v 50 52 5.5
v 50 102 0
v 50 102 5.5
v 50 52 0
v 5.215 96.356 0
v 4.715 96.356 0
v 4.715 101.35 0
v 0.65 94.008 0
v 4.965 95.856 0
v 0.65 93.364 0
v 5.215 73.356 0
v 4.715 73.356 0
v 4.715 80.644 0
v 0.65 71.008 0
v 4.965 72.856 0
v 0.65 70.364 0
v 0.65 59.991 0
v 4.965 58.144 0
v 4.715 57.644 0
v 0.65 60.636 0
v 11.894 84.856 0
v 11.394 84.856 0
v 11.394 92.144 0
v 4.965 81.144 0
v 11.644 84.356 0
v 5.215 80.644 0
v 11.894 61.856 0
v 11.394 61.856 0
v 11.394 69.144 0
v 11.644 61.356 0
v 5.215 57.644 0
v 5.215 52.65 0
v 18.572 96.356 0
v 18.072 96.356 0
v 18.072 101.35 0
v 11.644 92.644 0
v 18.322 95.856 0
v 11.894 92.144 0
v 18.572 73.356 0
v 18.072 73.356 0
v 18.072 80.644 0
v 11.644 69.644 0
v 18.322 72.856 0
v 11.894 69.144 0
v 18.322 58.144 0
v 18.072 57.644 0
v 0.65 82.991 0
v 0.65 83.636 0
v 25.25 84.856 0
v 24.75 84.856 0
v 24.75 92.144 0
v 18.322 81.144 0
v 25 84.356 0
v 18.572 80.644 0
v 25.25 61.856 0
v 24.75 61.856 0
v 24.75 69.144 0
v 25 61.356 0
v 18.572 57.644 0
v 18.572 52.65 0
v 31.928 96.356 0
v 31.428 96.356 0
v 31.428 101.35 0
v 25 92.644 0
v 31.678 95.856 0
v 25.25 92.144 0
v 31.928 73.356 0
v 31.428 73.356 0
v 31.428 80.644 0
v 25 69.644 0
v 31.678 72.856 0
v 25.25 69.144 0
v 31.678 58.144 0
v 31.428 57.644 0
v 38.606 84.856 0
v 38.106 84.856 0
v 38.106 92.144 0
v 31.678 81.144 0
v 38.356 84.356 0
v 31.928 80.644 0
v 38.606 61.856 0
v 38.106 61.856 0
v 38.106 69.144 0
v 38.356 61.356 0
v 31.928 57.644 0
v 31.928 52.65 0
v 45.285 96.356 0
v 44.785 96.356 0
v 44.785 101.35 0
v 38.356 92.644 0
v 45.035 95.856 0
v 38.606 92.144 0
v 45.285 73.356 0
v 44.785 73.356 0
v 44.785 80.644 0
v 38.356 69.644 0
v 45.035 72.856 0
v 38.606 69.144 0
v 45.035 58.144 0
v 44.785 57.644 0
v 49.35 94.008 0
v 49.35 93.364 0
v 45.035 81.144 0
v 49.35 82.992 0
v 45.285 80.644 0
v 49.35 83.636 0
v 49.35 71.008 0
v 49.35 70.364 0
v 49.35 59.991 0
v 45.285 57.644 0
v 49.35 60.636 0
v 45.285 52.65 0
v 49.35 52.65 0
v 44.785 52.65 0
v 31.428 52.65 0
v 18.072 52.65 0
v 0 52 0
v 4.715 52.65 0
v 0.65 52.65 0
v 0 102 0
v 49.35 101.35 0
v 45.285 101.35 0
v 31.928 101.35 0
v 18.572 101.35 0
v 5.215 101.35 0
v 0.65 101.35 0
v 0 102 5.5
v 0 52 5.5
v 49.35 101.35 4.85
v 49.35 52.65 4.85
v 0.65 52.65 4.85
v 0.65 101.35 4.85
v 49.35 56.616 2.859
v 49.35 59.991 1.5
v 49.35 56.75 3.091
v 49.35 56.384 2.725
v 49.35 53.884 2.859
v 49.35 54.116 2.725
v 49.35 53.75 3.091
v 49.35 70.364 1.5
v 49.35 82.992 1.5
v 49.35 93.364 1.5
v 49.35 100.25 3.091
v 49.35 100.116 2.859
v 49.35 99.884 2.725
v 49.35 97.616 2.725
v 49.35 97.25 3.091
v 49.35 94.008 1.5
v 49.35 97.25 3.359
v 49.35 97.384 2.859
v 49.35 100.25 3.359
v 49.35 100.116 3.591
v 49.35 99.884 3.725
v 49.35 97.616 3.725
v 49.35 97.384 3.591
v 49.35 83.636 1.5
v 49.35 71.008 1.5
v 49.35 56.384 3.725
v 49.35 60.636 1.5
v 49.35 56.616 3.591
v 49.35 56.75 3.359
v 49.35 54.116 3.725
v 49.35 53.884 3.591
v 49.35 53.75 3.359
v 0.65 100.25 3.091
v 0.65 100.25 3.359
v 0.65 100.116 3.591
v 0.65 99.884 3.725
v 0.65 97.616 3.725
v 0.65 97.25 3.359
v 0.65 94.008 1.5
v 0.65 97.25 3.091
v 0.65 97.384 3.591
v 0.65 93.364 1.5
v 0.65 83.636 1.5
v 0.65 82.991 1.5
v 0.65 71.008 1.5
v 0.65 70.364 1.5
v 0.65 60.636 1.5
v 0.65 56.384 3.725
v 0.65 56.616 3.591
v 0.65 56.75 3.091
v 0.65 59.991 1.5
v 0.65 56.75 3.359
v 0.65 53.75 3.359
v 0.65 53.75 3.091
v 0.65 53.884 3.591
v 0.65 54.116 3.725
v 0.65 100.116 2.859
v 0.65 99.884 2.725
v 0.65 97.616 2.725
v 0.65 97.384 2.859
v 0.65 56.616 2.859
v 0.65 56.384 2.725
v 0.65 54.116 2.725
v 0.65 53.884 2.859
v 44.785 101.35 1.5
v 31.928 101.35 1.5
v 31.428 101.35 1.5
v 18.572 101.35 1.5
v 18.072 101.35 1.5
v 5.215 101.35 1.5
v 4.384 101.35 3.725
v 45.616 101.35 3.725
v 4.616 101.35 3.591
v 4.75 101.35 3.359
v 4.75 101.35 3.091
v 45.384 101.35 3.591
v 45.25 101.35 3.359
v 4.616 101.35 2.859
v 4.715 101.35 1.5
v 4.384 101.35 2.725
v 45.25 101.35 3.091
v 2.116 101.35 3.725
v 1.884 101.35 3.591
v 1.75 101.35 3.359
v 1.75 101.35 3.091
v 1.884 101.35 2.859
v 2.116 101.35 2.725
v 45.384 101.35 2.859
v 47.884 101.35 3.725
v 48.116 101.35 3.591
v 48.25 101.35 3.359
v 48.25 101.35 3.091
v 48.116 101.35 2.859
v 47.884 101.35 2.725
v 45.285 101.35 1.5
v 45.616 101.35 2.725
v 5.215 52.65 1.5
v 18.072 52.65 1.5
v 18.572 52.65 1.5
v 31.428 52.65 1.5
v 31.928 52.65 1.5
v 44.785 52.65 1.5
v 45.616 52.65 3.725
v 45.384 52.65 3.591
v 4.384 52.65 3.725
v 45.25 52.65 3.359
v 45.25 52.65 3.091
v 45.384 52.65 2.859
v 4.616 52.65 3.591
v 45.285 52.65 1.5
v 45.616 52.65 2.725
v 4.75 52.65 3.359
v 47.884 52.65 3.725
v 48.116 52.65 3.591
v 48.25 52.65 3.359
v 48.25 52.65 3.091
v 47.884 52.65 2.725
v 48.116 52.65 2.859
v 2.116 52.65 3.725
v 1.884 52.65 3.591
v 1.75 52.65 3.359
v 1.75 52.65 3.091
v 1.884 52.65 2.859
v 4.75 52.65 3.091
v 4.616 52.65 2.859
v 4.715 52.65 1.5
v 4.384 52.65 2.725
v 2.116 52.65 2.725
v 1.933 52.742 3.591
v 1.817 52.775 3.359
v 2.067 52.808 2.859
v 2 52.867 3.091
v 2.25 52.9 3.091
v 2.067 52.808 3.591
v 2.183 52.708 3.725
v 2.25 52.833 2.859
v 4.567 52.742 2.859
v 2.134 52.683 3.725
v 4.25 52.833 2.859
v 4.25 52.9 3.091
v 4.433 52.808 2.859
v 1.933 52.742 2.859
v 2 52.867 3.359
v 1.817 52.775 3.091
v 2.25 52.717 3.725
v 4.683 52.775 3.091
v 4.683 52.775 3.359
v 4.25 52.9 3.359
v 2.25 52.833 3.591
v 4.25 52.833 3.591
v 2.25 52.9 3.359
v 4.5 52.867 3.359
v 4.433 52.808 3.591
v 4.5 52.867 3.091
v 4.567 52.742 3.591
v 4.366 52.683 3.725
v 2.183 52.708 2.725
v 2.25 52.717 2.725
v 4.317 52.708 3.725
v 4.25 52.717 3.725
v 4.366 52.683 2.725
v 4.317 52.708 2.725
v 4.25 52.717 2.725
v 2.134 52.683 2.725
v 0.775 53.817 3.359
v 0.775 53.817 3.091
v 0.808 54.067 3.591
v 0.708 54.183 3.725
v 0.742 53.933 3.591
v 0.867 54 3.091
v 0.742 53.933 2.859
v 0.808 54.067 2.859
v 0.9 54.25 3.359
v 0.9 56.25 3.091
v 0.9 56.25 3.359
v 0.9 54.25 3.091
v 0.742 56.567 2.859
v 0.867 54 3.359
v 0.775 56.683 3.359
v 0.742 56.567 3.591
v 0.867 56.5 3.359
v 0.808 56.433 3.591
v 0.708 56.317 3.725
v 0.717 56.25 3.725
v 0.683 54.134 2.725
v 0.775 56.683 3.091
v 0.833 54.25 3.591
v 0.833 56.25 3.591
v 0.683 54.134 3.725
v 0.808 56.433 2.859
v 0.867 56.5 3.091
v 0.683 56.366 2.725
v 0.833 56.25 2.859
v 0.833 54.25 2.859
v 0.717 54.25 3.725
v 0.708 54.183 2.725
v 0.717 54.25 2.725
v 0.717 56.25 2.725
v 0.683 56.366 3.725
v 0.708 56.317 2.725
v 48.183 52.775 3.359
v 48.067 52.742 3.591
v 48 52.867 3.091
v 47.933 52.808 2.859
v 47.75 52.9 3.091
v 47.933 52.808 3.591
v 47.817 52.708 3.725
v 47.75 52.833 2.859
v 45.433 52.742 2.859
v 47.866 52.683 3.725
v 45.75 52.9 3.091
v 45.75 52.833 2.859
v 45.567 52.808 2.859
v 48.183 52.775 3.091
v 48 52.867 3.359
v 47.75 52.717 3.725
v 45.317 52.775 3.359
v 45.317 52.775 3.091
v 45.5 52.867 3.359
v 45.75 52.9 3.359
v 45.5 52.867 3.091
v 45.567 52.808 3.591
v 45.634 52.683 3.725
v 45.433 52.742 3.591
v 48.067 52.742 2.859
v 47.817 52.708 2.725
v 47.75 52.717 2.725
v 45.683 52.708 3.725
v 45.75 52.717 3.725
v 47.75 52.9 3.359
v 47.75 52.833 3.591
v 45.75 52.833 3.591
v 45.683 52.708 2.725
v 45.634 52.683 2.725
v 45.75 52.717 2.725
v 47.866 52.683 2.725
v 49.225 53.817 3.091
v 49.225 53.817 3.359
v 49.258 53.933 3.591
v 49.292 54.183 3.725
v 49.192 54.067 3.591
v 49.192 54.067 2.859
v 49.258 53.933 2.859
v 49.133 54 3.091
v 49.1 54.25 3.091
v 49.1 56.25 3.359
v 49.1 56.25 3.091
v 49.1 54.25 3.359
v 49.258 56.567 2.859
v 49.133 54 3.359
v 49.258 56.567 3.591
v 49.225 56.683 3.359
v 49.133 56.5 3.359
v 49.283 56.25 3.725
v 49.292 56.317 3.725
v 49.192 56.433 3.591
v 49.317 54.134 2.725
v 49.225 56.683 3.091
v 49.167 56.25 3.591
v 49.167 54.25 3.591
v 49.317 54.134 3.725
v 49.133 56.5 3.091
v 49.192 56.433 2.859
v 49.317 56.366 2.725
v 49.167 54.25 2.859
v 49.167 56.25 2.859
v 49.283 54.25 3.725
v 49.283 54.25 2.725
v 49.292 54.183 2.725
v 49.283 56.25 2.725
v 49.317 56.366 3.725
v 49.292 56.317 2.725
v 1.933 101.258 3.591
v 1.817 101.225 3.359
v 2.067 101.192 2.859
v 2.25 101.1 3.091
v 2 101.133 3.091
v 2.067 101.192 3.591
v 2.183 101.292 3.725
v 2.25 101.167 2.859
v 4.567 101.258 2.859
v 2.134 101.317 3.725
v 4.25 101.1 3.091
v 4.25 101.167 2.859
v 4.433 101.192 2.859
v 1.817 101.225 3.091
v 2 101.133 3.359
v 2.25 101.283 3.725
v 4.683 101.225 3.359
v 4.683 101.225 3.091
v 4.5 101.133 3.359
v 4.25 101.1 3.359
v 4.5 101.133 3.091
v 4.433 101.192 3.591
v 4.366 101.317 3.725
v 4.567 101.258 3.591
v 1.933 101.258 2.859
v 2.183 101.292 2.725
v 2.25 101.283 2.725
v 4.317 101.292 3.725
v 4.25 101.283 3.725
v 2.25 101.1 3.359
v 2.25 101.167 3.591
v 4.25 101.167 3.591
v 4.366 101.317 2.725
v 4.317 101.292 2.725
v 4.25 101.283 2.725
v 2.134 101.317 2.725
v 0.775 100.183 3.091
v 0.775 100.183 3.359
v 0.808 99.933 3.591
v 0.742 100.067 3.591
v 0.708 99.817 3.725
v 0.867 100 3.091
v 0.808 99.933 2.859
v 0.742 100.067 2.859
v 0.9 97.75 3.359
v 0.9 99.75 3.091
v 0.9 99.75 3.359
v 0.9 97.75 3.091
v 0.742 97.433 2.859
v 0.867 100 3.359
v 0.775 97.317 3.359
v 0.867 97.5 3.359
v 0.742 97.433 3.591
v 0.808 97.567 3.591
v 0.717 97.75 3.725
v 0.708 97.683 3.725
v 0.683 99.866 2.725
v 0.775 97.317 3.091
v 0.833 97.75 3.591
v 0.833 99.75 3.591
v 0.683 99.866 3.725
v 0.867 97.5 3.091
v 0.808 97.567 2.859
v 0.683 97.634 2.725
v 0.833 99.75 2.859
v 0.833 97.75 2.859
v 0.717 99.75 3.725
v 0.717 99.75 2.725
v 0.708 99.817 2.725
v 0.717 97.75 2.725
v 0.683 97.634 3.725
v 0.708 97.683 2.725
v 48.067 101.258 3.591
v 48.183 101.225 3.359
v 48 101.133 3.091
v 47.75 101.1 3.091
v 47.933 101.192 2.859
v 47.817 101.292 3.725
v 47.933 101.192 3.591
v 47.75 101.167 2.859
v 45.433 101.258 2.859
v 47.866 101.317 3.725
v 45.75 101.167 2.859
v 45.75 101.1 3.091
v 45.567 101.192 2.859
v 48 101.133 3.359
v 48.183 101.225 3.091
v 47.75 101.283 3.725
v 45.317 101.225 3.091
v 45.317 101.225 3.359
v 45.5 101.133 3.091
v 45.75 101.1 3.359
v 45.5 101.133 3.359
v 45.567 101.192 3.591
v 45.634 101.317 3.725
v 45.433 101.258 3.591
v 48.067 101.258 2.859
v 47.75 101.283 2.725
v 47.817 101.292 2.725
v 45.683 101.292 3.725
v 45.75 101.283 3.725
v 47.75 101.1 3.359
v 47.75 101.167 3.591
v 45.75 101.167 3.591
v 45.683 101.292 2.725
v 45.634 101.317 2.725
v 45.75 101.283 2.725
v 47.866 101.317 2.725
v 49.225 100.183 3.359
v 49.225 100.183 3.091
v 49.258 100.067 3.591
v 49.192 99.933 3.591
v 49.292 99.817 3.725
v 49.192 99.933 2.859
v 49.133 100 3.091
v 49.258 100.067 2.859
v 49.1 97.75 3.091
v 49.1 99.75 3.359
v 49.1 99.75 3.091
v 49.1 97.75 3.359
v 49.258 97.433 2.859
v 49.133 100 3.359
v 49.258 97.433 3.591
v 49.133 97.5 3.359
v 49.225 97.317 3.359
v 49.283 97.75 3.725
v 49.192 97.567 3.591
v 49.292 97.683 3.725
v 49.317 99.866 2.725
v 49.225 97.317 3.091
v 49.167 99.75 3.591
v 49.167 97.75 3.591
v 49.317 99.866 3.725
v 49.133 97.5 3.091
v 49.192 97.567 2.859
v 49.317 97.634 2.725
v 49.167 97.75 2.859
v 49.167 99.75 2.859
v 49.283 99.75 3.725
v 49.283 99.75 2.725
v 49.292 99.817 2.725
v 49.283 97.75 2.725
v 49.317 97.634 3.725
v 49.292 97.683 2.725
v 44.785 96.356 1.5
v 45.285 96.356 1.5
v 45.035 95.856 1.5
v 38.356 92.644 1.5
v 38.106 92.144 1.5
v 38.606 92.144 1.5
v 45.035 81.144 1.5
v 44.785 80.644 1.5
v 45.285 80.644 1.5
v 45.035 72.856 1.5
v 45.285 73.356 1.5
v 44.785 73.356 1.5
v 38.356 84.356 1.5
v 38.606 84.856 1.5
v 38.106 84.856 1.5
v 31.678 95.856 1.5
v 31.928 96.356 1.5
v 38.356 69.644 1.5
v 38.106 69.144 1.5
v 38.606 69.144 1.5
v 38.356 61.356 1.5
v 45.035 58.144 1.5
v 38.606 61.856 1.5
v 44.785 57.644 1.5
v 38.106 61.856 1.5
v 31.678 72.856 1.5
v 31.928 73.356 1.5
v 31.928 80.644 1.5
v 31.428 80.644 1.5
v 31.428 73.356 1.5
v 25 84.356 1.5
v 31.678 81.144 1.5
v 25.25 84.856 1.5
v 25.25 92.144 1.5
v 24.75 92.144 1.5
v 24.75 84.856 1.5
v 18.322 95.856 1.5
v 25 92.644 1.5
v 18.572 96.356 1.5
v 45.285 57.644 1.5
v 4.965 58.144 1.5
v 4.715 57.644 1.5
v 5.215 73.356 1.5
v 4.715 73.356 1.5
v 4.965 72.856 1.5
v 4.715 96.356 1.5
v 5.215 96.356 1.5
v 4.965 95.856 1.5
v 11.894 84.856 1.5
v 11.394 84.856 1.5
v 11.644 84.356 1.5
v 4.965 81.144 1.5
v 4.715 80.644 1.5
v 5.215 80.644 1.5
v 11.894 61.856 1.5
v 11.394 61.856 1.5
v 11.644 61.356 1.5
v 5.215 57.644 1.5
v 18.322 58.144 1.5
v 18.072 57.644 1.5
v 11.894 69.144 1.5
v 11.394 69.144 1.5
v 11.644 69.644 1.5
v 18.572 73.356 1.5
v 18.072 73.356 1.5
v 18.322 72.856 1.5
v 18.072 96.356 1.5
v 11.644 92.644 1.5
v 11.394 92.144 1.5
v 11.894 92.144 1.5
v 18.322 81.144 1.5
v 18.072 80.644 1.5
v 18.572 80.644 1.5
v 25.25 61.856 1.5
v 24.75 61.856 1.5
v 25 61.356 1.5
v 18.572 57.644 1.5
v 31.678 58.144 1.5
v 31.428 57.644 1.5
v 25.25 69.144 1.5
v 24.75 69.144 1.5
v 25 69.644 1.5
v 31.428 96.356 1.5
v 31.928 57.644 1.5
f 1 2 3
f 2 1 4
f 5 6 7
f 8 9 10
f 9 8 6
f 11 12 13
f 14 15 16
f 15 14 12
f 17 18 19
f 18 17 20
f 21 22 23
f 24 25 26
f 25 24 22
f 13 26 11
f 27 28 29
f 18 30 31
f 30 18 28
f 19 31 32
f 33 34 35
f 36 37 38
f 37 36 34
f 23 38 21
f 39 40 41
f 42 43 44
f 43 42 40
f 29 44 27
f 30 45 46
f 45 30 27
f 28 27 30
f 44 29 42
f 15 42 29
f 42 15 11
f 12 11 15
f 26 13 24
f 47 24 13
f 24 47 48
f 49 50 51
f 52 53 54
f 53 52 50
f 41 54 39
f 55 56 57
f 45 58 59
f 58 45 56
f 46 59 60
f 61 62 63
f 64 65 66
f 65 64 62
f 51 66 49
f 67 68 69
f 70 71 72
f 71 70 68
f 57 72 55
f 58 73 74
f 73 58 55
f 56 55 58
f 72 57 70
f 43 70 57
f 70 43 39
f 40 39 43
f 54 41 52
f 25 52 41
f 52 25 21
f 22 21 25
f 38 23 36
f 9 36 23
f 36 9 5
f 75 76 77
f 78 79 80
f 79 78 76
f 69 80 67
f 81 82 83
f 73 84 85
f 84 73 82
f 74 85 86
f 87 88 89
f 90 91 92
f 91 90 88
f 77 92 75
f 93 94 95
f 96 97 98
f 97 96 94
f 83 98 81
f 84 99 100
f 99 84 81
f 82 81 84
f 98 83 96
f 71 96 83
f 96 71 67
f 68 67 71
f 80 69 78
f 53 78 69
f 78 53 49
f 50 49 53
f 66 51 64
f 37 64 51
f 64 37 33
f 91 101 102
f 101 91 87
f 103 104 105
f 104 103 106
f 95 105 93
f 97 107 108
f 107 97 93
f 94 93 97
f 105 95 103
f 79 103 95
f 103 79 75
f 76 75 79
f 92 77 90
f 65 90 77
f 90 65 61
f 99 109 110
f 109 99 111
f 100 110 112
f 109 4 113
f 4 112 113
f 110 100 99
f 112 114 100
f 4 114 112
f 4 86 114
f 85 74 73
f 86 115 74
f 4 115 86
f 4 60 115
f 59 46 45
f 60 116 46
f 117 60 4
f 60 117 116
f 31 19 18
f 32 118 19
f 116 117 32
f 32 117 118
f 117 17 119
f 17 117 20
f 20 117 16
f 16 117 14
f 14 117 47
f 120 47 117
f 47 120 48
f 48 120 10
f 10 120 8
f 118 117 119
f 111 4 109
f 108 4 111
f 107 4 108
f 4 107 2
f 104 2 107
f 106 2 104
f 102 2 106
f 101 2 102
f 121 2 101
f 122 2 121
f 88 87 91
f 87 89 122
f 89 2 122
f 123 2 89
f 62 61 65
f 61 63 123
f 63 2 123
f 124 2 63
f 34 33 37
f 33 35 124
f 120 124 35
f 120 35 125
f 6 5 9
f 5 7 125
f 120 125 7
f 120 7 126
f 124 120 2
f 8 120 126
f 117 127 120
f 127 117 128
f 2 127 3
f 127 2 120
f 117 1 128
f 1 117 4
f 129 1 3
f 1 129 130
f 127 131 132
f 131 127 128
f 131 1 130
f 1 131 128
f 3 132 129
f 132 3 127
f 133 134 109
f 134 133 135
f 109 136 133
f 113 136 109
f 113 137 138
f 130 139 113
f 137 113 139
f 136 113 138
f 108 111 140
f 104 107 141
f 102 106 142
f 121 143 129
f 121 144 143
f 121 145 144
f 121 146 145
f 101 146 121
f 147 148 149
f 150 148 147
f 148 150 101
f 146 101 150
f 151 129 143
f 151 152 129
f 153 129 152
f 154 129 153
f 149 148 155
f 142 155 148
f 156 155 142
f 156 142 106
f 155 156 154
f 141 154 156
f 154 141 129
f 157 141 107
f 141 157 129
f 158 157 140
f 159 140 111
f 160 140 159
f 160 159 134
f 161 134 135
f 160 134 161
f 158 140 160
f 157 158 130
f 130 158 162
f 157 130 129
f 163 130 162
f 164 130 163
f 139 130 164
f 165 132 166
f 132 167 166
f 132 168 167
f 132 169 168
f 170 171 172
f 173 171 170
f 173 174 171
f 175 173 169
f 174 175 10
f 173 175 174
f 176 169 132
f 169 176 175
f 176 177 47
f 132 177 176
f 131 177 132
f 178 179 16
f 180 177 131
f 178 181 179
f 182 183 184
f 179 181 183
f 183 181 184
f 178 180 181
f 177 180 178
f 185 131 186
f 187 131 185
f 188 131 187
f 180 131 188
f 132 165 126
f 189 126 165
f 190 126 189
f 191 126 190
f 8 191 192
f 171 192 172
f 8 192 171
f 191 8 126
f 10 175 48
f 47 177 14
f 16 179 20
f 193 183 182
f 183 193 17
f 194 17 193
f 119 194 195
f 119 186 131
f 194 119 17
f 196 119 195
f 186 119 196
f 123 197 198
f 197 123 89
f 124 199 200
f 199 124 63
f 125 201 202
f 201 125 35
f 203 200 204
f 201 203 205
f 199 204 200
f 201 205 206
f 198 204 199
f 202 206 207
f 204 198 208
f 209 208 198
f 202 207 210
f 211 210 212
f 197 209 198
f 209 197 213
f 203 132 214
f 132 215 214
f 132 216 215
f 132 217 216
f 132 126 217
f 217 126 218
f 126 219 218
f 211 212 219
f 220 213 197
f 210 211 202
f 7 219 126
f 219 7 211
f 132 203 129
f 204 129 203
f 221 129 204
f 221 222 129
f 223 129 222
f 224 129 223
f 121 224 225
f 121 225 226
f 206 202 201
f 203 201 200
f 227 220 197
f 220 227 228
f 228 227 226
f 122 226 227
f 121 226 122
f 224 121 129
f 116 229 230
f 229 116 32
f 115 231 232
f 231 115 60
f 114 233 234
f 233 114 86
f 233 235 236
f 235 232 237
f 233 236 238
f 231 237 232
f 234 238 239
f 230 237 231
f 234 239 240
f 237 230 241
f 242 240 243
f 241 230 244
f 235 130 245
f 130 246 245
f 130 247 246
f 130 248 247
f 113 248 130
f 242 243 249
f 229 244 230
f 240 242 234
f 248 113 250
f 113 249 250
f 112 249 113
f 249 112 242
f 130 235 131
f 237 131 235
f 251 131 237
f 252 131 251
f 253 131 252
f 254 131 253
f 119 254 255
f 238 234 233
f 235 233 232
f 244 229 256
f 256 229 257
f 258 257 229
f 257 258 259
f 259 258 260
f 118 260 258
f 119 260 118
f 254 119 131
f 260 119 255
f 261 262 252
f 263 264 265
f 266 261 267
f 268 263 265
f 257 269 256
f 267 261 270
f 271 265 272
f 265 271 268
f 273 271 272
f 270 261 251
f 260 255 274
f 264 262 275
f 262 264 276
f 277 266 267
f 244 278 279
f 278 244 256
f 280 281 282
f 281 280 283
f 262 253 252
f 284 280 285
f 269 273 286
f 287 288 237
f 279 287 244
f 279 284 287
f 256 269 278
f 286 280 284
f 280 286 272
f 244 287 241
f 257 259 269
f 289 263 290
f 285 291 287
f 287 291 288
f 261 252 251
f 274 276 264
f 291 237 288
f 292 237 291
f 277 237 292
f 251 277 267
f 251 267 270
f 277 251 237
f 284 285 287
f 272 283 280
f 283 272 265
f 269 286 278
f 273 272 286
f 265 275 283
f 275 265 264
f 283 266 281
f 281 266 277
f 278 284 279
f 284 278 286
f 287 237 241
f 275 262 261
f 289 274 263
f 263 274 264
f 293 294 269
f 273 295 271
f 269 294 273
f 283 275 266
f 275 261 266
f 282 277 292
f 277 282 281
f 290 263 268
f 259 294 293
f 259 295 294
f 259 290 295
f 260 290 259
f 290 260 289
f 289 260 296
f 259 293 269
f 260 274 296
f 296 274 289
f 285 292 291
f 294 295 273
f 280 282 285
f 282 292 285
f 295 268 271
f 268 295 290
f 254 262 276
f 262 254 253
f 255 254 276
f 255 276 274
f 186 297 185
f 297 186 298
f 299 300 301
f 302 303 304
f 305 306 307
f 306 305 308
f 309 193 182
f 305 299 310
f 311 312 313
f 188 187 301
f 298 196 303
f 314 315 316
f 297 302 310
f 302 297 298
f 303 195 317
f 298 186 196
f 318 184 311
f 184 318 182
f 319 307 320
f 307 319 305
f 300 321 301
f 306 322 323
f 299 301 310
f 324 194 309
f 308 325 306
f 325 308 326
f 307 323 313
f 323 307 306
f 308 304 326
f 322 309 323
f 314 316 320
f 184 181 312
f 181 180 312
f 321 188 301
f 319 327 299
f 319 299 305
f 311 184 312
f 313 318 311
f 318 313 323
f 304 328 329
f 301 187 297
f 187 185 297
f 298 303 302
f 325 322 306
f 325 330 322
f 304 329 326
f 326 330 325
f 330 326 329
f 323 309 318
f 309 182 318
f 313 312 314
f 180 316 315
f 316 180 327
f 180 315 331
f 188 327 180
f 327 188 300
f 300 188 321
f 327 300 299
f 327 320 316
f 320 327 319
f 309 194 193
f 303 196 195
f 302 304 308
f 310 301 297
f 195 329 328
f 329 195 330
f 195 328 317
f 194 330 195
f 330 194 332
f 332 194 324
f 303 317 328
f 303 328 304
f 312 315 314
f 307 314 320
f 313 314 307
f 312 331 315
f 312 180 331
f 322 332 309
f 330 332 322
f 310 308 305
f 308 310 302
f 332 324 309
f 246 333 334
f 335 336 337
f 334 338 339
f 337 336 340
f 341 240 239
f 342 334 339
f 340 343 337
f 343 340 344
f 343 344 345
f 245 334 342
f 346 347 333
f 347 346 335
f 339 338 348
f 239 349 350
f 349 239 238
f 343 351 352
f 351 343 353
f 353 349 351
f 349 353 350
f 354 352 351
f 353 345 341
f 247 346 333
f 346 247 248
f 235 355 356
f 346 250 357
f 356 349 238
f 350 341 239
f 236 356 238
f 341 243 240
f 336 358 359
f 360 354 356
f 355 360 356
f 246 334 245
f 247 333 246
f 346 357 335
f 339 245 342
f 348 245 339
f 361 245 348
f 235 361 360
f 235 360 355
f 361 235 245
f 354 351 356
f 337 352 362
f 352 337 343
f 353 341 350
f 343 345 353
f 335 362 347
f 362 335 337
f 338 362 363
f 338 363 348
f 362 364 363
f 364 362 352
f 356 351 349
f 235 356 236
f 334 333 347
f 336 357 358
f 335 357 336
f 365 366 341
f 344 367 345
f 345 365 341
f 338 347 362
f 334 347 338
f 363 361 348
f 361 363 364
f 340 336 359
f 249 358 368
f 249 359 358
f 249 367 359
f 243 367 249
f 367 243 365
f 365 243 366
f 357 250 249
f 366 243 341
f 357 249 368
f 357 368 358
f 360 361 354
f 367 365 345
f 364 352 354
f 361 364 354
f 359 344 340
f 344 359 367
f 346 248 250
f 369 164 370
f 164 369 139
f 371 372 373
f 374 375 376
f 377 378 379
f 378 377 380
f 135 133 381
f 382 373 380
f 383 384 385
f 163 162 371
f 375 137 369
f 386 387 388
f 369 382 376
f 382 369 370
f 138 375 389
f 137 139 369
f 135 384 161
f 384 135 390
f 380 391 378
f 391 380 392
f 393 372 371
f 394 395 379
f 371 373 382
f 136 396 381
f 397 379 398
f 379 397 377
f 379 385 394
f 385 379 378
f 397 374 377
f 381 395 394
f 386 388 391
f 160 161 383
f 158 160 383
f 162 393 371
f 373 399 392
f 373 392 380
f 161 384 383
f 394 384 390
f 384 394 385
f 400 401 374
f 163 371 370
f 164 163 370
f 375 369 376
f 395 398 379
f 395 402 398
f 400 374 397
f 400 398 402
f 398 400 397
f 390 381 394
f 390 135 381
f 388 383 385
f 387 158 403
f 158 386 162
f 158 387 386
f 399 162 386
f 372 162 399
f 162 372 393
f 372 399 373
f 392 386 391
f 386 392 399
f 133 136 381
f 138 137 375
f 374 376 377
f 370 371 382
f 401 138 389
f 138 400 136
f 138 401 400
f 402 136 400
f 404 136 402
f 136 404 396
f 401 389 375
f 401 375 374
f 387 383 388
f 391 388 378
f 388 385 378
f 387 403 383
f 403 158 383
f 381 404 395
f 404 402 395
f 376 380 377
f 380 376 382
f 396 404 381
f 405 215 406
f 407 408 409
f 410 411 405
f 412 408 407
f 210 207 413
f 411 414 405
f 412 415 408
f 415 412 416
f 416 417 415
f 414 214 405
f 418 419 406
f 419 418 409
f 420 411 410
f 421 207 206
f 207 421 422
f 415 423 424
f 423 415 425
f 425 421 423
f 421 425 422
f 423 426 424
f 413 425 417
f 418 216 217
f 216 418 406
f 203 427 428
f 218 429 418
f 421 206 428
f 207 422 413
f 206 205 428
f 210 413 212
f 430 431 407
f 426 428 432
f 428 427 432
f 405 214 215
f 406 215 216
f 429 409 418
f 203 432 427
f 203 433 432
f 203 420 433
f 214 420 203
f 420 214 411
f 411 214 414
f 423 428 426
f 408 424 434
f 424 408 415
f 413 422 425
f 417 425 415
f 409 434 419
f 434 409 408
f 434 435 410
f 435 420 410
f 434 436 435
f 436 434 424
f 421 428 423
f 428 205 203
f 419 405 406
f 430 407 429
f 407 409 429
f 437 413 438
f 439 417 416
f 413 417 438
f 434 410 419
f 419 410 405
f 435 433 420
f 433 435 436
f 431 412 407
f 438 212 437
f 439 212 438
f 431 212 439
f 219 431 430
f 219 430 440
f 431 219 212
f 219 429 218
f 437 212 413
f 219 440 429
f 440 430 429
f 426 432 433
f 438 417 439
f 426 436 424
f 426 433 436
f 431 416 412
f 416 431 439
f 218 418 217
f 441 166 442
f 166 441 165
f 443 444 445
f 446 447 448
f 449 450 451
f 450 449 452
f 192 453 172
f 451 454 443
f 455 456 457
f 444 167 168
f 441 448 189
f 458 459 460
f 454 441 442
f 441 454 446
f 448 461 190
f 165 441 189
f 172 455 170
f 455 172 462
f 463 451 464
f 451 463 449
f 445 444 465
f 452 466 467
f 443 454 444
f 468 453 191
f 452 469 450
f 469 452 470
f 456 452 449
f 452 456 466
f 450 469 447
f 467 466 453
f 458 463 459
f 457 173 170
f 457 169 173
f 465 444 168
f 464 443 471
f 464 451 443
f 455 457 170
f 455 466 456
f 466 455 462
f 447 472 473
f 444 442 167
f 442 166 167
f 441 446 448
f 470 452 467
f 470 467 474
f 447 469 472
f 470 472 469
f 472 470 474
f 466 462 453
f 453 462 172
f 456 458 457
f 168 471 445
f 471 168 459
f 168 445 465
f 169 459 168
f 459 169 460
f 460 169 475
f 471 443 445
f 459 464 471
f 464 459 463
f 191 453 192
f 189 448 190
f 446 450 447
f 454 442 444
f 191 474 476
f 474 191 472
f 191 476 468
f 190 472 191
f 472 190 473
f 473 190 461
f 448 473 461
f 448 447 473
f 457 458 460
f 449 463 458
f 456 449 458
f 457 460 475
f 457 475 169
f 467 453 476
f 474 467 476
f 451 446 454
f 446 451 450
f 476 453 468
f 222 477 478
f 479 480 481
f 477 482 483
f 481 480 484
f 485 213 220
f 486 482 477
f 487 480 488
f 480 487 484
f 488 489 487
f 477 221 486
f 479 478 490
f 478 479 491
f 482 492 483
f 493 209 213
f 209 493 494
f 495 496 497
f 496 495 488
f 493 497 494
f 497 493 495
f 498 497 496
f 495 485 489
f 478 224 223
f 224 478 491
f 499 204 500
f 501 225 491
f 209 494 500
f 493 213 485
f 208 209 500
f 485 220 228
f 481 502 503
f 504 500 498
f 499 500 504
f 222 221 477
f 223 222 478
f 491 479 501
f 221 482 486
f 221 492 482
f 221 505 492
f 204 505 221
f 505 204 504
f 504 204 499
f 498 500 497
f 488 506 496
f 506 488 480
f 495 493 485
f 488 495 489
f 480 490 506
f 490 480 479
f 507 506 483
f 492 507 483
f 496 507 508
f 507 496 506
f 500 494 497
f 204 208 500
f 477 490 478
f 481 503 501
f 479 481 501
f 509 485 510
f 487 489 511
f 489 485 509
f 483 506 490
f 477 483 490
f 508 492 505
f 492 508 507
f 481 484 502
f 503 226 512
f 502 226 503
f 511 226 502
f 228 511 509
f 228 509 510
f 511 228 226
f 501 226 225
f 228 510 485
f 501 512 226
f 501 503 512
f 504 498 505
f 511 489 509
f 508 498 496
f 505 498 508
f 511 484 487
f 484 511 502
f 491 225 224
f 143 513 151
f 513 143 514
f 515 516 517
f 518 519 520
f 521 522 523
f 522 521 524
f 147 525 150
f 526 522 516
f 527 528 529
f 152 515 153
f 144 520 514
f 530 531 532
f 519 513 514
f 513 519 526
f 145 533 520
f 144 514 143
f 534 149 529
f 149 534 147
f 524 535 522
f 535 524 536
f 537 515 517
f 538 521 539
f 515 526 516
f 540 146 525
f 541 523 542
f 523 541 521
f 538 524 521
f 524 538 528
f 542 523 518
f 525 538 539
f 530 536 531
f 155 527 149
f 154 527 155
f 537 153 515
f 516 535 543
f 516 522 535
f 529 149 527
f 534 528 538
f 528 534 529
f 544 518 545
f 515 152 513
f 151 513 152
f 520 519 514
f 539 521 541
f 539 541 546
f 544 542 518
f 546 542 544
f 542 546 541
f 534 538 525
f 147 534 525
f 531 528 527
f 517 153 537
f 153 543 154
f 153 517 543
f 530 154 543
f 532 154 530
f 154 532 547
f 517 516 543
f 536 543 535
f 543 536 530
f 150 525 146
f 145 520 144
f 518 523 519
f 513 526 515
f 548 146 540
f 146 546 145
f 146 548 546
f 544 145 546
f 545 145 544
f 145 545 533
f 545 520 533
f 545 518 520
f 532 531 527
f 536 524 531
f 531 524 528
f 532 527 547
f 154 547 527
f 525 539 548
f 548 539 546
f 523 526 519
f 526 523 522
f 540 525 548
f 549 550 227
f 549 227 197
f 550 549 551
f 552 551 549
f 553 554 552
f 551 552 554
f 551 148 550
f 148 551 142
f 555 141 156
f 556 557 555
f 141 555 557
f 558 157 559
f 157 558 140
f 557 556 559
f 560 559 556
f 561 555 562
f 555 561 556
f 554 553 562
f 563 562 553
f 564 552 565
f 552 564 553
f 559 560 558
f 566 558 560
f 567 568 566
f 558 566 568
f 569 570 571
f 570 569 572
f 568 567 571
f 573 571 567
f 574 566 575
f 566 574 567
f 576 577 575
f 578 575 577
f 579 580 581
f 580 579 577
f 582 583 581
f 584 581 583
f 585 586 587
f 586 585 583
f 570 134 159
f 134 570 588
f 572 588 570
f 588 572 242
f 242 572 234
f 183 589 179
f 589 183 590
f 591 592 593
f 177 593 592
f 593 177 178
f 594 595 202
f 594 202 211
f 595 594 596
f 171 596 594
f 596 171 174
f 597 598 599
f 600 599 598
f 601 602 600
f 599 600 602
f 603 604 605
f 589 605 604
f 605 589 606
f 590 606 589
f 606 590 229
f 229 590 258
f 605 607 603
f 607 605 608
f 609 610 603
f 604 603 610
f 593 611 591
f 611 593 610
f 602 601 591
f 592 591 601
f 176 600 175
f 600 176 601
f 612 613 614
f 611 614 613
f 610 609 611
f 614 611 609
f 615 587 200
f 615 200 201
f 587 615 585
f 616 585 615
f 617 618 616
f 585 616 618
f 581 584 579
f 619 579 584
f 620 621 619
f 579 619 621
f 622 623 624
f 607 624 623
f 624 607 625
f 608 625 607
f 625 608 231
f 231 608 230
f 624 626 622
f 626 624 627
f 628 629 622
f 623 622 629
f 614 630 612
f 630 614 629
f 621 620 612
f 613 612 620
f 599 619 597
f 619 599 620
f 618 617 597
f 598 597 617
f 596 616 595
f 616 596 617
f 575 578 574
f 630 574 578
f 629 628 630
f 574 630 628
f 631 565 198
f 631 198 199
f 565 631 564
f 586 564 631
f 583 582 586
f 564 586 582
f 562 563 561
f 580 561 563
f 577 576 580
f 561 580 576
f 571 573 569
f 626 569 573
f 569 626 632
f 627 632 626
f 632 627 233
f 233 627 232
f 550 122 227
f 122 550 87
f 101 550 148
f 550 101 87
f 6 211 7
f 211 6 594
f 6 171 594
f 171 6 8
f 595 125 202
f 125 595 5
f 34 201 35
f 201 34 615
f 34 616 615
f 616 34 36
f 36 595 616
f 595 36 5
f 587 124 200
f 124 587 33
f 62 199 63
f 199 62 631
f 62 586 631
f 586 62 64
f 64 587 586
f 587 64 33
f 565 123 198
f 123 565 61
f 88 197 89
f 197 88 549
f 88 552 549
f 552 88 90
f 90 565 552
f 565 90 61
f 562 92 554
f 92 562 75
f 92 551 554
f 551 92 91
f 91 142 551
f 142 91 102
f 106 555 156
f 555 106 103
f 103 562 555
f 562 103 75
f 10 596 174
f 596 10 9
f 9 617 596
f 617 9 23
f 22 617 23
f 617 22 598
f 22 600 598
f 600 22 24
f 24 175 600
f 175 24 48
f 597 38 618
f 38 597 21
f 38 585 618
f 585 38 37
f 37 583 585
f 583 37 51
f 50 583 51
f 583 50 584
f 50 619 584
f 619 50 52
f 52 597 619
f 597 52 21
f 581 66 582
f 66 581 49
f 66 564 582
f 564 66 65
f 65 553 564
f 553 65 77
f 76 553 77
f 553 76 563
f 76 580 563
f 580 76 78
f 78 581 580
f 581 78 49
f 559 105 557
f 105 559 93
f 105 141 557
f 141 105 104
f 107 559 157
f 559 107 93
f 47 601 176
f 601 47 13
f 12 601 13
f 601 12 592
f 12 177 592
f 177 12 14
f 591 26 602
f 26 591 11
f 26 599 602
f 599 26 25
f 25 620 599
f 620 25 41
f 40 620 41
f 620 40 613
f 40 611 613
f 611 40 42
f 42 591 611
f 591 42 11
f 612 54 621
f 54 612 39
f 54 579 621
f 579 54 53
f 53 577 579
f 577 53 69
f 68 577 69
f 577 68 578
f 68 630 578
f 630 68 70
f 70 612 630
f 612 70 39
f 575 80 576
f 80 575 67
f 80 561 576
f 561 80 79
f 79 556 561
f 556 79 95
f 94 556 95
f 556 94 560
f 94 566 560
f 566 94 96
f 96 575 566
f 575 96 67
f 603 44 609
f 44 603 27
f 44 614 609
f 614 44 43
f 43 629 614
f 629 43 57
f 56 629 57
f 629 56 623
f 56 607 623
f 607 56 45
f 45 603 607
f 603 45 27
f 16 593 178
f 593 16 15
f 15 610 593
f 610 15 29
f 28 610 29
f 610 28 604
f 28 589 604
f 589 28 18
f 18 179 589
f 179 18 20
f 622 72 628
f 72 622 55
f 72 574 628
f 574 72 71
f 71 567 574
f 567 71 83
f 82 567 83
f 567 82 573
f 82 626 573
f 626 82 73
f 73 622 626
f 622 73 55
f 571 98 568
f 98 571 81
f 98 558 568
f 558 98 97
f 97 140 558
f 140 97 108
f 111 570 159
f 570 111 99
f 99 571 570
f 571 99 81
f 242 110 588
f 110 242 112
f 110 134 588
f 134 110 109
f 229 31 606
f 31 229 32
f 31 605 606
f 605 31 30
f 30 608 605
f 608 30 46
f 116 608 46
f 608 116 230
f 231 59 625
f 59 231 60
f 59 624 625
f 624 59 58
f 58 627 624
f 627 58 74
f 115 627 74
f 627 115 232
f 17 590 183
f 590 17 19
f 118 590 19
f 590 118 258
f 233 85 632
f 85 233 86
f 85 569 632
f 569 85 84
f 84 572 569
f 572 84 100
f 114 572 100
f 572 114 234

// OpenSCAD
// Test: g_b_print_lid=true, g_b_print_box=false — should only render the lid
include <../boardgame_insert_toolkit_lib.4.scad>;

g_b_print_lid = true;
g_b_print_box = false;
g_isolated_print_box = "";

data = [
    [ "lid only",
        [
            [ BOX_SIZE_XYZ, [50, 50, 20] ],
            [ BOX_LID,
                [
                    [ LID_PATTERN_RADIUS, 8 ],
                ]
            ],
            [ BOX_COMPONENT,
                [
                    [ CMP_COMPARTMENT_SIZE_XYZ, [46, 46, 18] ],
                ]
            ],
        ]
    ],
];

MakeAll();
